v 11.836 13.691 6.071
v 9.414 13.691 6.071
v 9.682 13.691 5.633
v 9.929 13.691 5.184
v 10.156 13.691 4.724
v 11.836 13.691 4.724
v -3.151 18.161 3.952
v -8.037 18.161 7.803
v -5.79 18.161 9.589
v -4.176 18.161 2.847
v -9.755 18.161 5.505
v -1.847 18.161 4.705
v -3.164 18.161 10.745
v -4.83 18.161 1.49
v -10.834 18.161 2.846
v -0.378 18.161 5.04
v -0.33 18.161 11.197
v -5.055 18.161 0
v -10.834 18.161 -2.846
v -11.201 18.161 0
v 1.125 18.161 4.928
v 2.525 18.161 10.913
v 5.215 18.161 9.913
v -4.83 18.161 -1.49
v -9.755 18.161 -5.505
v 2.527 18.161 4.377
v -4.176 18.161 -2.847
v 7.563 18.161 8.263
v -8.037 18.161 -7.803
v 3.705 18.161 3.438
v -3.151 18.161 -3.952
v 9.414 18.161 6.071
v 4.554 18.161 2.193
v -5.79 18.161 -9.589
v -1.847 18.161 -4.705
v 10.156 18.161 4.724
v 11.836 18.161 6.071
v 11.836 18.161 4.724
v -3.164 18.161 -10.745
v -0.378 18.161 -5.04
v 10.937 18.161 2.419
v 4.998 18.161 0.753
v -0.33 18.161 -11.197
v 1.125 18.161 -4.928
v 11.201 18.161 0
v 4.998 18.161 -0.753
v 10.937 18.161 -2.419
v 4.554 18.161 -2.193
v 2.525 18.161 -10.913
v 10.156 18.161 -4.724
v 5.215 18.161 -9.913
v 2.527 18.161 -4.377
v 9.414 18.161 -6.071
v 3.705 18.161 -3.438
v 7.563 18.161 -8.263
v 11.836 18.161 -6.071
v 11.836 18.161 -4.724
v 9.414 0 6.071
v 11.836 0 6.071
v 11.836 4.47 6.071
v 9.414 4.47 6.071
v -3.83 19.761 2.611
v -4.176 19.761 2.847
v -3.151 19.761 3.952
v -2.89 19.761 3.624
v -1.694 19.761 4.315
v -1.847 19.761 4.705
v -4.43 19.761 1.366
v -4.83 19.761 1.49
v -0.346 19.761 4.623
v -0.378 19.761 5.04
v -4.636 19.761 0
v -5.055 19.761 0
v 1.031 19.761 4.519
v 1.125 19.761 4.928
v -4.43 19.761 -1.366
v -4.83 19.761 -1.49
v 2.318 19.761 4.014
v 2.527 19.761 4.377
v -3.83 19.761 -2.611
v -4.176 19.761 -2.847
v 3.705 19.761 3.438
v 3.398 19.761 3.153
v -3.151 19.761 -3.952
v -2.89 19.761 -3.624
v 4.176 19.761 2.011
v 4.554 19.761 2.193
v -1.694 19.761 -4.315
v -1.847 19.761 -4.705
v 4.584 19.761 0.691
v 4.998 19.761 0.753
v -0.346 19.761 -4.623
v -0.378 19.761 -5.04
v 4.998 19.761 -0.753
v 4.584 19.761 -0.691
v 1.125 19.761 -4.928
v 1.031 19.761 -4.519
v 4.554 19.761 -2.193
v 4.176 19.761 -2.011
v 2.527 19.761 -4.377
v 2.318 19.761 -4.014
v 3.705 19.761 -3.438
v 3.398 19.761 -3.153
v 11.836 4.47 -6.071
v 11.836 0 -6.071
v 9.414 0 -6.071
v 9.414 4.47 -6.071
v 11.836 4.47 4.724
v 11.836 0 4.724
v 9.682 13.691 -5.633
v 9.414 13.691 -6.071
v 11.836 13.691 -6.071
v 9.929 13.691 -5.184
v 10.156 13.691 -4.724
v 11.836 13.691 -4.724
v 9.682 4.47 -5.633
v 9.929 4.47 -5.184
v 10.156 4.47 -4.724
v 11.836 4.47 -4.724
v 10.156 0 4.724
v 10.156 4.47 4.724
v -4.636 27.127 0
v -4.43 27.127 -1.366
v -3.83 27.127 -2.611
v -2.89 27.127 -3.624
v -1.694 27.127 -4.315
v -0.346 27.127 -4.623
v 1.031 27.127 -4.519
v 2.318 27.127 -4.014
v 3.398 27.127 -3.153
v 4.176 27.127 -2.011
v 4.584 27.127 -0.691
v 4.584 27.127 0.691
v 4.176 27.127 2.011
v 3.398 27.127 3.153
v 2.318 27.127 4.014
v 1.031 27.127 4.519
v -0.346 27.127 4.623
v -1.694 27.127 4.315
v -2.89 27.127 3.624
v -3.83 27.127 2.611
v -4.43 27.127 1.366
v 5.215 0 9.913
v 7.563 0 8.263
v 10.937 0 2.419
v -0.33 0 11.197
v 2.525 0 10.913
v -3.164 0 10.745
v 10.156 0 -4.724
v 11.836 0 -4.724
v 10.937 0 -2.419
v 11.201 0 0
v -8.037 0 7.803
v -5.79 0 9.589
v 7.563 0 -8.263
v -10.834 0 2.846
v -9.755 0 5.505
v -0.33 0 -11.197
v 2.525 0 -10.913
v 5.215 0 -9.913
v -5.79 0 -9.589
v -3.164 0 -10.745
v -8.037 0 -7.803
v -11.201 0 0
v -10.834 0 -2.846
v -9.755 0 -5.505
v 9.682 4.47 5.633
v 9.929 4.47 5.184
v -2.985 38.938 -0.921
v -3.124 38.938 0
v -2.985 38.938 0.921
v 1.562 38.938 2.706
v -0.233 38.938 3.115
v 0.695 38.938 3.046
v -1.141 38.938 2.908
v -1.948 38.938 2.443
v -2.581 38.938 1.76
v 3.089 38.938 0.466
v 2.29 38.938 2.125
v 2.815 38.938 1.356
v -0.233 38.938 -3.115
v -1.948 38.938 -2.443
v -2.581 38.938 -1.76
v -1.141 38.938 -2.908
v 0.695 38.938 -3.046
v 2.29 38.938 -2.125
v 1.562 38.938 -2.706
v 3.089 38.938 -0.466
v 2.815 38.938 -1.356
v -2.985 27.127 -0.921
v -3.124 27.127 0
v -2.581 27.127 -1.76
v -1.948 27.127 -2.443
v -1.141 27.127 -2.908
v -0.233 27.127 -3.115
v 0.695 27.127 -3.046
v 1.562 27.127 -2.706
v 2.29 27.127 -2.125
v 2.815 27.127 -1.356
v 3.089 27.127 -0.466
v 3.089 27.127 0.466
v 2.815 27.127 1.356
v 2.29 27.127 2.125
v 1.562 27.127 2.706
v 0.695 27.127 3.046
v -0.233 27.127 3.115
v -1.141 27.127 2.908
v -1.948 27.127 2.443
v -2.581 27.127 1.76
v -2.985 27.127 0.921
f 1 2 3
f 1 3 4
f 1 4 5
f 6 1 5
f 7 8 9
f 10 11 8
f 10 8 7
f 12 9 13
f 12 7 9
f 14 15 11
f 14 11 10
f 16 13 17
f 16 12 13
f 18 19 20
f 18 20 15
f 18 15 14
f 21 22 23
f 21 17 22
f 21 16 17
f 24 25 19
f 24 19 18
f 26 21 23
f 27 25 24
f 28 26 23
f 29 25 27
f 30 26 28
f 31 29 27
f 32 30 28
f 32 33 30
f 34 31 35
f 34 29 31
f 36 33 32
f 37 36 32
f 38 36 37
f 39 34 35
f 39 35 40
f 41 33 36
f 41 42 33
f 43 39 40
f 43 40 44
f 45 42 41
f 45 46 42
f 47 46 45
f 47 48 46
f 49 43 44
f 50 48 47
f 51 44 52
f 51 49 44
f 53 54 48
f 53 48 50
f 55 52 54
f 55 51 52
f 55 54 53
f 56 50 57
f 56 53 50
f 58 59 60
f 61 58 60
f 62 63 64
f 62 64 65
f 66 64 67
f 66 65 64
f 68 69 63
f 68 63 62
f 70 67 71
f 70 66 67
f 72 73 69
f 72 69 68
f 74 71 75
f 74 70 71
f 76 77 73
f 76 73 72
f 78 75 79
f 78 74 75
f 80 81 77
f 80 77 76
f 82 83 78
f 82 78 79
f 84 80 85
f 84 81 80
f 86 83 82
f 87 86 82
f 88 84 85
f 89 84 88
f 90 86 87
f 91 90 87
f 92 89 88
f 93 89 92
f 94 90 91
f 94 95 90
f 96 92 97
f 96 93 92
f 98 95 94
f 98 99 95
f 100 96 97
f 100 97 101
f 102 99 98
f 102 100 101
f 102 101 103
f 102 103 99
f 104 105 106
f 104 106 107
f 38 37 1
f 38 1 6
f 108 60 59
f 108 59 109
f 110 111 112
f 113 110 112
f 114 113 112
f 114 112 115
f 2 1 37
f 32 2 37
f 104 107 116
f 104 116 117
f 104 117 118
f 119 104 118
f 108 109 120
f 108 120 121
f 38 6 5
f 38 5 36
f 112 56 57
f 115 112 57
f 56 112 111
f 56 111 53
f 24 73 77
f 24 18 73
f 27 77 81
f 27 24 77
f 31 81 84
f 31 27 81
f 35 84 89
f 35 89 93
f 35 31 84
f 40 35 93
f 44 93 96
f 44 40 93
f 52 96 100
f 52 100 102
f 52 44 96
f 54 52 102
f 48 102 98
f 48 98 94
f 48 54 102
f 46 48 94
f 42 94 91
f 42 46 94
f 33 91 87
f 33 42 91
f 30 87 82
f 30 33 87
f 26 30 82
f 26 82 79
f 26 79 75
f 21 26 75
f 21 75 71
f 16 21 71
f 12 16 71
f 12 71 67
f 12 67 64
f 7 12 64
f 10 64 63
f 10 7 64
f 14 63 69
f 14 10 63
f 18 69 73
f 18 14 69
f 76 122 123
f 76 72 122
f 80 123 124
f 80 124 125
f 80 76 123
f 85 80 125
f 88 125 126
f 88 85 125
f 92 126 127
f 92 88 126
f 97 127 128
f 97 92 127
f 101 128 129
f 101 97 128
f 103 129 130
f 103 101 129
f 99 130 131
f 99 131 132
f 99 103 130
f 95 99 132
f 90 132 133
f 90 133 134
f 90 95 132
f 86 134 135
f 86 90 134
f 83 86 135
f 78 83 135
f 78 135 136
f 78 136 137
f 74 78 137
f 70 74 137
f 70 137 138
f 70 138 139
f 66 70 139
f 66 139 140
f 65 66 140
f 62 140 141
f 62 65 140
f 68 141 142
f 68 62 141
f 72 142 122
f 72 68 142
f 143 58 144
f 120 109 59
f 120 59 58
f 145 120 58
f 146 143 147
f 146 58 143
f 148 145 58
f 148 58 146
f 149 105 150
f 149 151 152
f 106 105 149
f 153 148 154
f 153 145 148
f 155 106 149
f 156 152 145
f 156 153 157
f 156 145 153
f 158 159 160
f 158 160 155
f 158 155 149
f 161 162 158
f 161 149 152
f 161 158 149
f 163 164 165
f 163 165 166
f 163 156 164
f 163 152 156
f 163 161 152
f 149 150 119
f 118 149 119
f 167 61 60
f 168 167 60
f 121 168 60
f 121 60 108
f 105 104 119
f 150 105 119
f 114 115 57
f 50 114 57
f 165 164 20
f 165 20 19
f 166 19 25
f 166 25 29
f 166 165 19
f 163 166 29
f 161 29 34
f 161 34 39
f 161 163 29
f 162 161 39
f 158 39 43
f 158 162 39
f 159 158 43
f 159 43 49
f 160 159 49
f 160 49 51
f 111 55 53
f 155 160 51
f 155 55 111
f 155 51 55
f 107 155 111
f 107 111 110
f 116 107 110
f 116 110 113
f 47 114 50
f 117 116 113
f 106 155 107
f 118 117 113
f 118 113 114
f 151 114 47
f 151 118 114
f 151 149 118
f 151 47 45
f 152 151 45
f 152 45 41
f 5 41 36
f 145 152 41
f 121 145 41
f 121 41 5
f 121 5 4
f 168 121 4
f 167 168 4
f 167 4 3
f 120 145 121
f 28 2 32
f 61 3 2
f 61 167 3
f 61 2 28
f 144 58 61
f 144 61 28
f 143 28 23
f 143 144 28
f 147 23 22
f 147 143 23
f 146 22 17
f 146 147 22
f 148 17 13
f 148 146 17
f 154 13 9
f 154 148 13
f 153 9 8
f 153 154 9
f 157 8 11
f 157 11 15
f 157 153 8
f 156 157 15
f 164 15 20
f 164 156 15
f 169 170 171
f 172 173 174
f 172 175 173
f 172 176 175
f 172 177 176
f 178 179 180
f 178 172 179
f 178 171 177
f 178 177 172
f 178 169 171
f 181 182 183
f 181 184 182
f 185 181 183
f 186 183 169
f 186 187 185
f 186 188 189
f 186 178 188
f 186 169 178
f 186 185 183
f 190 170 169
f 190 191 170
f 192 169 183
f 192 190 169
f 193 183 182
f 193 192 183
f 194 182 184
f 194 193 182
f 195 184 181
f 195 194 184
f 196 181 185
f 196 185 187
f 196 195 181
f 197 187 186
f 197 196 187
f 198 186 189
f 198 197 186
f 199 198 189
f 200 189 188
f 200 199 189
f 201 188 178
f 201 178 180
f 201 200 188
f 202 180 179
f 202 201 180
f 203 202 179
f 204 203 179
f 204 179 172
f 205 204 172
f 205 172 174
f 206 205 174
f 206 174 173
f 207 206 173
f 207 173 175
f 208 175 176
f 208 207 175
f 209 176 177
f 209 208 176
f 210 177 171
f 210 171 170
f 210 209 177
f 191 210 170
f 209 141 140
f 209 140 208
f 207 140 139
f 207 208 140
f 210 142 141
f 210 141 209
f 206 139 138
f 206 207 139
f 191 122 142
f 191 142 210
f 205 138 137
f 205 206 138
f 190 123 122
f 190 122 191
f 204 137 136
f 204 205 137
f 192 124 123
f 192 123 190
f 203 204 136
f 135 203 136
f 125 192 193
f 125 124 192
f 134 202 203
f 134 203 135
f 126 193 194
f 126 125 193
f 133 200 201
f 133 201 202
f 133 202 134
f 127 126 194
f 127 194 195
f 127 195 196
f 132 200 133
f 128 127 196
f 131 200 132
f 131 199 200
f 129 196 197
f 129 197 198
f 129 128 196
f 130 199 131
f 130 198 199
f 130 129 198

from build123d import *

# Parameters (mm, degrees)
BOSS_EXTRUDE1_REACH      = 48.609
BOSS_EXTRUDE1_END_RADIUS = 11.2014
SKETCH2_W                = 1.3462
SKETCH2_H                = 4.4704


with BuildPart() as part:
    # Sketch1 → Revolve1 (revolve)
    with BuildSketch(Plane.XY):
        Polygon((-11.2014, 18.161), (-11.2014, 0), (0, 0), (0, 38.9382), (-3.1242, 38.9382), (-3.1242, 27.1272), (-4.6355, 27.1272), (-4.6355, 19.7612), (-5.0546, 19.7612), (-5.0546, 18.161), align=None)
    revolve(axis=Axis((0, 0, 0), (0, -1, 0)))

    # Boss-Extrude1: up to this cylinder (the profile starts outside it)
    boss_extrude1_end = Plane(origin=(0, 9.0805, 0), z_dir=(0, 1, 0)) * Cylinder(BOSS_EXTRUDE1_END_RADIUS, 134.3114, mode=Mode.PRIVATE)
    # Sketch2 → Boss-Extrude1 (add, up to the surface)
    with BuildSketch(Plane(origin=(11.8364, 0, 0), x_dir=(0, 0, -1), z_dir=(1, 0, 0)), mode=Mode.PRIVATE) as boss_extrude1_sk1:
        with Locations((-5.3975, 15.9258)):
            Rectangle(SKETCH2_W, SKETCH2_H)
    boss_extrude1_tool1 = extrude(boss_extrude1_sk1.sketch, amount=-BOSS_EXTRUDE1_REACH, mode=Mode.PRIVATE) - boss_extrude1_end
    # Sketch2 → Boss-Extrude1 (add, up to the surface)
    with BuildSketch(Plane(origin=(11.8364, 0, 0), x_dir=(0, 0, -1), z_dir=(1, 0, 0)), mode=Mode.PRIVATE) as boss_extrude1_sk2:
        with Locations((-5.3975, 2.2352)):
            Rectangle(SKETCH2_W, SKETCH2_H)
    boss_extrude1_tool2 = extrude(boss_extrude1_sk2.sketch, amount=-BOSS_EXTRUDE1_REACH, mode=Mode.PRIVATE) - boss_extrude1_end
    boss_extrude1 = boss_extrude1_tool1.solids().sort_by_distance((11.8364, 15.9258, 5.3975))[0] + boss_extrude1_tool2.solids().sort_by_distance((11.8364, 2.2352, 5.3975))[0]
    add(boss_extrude1)

    # Mirror1: Boss-Extrude1 across plane
    add(boss_extrude1.mirror(Plane.XY))


solid = part.part
